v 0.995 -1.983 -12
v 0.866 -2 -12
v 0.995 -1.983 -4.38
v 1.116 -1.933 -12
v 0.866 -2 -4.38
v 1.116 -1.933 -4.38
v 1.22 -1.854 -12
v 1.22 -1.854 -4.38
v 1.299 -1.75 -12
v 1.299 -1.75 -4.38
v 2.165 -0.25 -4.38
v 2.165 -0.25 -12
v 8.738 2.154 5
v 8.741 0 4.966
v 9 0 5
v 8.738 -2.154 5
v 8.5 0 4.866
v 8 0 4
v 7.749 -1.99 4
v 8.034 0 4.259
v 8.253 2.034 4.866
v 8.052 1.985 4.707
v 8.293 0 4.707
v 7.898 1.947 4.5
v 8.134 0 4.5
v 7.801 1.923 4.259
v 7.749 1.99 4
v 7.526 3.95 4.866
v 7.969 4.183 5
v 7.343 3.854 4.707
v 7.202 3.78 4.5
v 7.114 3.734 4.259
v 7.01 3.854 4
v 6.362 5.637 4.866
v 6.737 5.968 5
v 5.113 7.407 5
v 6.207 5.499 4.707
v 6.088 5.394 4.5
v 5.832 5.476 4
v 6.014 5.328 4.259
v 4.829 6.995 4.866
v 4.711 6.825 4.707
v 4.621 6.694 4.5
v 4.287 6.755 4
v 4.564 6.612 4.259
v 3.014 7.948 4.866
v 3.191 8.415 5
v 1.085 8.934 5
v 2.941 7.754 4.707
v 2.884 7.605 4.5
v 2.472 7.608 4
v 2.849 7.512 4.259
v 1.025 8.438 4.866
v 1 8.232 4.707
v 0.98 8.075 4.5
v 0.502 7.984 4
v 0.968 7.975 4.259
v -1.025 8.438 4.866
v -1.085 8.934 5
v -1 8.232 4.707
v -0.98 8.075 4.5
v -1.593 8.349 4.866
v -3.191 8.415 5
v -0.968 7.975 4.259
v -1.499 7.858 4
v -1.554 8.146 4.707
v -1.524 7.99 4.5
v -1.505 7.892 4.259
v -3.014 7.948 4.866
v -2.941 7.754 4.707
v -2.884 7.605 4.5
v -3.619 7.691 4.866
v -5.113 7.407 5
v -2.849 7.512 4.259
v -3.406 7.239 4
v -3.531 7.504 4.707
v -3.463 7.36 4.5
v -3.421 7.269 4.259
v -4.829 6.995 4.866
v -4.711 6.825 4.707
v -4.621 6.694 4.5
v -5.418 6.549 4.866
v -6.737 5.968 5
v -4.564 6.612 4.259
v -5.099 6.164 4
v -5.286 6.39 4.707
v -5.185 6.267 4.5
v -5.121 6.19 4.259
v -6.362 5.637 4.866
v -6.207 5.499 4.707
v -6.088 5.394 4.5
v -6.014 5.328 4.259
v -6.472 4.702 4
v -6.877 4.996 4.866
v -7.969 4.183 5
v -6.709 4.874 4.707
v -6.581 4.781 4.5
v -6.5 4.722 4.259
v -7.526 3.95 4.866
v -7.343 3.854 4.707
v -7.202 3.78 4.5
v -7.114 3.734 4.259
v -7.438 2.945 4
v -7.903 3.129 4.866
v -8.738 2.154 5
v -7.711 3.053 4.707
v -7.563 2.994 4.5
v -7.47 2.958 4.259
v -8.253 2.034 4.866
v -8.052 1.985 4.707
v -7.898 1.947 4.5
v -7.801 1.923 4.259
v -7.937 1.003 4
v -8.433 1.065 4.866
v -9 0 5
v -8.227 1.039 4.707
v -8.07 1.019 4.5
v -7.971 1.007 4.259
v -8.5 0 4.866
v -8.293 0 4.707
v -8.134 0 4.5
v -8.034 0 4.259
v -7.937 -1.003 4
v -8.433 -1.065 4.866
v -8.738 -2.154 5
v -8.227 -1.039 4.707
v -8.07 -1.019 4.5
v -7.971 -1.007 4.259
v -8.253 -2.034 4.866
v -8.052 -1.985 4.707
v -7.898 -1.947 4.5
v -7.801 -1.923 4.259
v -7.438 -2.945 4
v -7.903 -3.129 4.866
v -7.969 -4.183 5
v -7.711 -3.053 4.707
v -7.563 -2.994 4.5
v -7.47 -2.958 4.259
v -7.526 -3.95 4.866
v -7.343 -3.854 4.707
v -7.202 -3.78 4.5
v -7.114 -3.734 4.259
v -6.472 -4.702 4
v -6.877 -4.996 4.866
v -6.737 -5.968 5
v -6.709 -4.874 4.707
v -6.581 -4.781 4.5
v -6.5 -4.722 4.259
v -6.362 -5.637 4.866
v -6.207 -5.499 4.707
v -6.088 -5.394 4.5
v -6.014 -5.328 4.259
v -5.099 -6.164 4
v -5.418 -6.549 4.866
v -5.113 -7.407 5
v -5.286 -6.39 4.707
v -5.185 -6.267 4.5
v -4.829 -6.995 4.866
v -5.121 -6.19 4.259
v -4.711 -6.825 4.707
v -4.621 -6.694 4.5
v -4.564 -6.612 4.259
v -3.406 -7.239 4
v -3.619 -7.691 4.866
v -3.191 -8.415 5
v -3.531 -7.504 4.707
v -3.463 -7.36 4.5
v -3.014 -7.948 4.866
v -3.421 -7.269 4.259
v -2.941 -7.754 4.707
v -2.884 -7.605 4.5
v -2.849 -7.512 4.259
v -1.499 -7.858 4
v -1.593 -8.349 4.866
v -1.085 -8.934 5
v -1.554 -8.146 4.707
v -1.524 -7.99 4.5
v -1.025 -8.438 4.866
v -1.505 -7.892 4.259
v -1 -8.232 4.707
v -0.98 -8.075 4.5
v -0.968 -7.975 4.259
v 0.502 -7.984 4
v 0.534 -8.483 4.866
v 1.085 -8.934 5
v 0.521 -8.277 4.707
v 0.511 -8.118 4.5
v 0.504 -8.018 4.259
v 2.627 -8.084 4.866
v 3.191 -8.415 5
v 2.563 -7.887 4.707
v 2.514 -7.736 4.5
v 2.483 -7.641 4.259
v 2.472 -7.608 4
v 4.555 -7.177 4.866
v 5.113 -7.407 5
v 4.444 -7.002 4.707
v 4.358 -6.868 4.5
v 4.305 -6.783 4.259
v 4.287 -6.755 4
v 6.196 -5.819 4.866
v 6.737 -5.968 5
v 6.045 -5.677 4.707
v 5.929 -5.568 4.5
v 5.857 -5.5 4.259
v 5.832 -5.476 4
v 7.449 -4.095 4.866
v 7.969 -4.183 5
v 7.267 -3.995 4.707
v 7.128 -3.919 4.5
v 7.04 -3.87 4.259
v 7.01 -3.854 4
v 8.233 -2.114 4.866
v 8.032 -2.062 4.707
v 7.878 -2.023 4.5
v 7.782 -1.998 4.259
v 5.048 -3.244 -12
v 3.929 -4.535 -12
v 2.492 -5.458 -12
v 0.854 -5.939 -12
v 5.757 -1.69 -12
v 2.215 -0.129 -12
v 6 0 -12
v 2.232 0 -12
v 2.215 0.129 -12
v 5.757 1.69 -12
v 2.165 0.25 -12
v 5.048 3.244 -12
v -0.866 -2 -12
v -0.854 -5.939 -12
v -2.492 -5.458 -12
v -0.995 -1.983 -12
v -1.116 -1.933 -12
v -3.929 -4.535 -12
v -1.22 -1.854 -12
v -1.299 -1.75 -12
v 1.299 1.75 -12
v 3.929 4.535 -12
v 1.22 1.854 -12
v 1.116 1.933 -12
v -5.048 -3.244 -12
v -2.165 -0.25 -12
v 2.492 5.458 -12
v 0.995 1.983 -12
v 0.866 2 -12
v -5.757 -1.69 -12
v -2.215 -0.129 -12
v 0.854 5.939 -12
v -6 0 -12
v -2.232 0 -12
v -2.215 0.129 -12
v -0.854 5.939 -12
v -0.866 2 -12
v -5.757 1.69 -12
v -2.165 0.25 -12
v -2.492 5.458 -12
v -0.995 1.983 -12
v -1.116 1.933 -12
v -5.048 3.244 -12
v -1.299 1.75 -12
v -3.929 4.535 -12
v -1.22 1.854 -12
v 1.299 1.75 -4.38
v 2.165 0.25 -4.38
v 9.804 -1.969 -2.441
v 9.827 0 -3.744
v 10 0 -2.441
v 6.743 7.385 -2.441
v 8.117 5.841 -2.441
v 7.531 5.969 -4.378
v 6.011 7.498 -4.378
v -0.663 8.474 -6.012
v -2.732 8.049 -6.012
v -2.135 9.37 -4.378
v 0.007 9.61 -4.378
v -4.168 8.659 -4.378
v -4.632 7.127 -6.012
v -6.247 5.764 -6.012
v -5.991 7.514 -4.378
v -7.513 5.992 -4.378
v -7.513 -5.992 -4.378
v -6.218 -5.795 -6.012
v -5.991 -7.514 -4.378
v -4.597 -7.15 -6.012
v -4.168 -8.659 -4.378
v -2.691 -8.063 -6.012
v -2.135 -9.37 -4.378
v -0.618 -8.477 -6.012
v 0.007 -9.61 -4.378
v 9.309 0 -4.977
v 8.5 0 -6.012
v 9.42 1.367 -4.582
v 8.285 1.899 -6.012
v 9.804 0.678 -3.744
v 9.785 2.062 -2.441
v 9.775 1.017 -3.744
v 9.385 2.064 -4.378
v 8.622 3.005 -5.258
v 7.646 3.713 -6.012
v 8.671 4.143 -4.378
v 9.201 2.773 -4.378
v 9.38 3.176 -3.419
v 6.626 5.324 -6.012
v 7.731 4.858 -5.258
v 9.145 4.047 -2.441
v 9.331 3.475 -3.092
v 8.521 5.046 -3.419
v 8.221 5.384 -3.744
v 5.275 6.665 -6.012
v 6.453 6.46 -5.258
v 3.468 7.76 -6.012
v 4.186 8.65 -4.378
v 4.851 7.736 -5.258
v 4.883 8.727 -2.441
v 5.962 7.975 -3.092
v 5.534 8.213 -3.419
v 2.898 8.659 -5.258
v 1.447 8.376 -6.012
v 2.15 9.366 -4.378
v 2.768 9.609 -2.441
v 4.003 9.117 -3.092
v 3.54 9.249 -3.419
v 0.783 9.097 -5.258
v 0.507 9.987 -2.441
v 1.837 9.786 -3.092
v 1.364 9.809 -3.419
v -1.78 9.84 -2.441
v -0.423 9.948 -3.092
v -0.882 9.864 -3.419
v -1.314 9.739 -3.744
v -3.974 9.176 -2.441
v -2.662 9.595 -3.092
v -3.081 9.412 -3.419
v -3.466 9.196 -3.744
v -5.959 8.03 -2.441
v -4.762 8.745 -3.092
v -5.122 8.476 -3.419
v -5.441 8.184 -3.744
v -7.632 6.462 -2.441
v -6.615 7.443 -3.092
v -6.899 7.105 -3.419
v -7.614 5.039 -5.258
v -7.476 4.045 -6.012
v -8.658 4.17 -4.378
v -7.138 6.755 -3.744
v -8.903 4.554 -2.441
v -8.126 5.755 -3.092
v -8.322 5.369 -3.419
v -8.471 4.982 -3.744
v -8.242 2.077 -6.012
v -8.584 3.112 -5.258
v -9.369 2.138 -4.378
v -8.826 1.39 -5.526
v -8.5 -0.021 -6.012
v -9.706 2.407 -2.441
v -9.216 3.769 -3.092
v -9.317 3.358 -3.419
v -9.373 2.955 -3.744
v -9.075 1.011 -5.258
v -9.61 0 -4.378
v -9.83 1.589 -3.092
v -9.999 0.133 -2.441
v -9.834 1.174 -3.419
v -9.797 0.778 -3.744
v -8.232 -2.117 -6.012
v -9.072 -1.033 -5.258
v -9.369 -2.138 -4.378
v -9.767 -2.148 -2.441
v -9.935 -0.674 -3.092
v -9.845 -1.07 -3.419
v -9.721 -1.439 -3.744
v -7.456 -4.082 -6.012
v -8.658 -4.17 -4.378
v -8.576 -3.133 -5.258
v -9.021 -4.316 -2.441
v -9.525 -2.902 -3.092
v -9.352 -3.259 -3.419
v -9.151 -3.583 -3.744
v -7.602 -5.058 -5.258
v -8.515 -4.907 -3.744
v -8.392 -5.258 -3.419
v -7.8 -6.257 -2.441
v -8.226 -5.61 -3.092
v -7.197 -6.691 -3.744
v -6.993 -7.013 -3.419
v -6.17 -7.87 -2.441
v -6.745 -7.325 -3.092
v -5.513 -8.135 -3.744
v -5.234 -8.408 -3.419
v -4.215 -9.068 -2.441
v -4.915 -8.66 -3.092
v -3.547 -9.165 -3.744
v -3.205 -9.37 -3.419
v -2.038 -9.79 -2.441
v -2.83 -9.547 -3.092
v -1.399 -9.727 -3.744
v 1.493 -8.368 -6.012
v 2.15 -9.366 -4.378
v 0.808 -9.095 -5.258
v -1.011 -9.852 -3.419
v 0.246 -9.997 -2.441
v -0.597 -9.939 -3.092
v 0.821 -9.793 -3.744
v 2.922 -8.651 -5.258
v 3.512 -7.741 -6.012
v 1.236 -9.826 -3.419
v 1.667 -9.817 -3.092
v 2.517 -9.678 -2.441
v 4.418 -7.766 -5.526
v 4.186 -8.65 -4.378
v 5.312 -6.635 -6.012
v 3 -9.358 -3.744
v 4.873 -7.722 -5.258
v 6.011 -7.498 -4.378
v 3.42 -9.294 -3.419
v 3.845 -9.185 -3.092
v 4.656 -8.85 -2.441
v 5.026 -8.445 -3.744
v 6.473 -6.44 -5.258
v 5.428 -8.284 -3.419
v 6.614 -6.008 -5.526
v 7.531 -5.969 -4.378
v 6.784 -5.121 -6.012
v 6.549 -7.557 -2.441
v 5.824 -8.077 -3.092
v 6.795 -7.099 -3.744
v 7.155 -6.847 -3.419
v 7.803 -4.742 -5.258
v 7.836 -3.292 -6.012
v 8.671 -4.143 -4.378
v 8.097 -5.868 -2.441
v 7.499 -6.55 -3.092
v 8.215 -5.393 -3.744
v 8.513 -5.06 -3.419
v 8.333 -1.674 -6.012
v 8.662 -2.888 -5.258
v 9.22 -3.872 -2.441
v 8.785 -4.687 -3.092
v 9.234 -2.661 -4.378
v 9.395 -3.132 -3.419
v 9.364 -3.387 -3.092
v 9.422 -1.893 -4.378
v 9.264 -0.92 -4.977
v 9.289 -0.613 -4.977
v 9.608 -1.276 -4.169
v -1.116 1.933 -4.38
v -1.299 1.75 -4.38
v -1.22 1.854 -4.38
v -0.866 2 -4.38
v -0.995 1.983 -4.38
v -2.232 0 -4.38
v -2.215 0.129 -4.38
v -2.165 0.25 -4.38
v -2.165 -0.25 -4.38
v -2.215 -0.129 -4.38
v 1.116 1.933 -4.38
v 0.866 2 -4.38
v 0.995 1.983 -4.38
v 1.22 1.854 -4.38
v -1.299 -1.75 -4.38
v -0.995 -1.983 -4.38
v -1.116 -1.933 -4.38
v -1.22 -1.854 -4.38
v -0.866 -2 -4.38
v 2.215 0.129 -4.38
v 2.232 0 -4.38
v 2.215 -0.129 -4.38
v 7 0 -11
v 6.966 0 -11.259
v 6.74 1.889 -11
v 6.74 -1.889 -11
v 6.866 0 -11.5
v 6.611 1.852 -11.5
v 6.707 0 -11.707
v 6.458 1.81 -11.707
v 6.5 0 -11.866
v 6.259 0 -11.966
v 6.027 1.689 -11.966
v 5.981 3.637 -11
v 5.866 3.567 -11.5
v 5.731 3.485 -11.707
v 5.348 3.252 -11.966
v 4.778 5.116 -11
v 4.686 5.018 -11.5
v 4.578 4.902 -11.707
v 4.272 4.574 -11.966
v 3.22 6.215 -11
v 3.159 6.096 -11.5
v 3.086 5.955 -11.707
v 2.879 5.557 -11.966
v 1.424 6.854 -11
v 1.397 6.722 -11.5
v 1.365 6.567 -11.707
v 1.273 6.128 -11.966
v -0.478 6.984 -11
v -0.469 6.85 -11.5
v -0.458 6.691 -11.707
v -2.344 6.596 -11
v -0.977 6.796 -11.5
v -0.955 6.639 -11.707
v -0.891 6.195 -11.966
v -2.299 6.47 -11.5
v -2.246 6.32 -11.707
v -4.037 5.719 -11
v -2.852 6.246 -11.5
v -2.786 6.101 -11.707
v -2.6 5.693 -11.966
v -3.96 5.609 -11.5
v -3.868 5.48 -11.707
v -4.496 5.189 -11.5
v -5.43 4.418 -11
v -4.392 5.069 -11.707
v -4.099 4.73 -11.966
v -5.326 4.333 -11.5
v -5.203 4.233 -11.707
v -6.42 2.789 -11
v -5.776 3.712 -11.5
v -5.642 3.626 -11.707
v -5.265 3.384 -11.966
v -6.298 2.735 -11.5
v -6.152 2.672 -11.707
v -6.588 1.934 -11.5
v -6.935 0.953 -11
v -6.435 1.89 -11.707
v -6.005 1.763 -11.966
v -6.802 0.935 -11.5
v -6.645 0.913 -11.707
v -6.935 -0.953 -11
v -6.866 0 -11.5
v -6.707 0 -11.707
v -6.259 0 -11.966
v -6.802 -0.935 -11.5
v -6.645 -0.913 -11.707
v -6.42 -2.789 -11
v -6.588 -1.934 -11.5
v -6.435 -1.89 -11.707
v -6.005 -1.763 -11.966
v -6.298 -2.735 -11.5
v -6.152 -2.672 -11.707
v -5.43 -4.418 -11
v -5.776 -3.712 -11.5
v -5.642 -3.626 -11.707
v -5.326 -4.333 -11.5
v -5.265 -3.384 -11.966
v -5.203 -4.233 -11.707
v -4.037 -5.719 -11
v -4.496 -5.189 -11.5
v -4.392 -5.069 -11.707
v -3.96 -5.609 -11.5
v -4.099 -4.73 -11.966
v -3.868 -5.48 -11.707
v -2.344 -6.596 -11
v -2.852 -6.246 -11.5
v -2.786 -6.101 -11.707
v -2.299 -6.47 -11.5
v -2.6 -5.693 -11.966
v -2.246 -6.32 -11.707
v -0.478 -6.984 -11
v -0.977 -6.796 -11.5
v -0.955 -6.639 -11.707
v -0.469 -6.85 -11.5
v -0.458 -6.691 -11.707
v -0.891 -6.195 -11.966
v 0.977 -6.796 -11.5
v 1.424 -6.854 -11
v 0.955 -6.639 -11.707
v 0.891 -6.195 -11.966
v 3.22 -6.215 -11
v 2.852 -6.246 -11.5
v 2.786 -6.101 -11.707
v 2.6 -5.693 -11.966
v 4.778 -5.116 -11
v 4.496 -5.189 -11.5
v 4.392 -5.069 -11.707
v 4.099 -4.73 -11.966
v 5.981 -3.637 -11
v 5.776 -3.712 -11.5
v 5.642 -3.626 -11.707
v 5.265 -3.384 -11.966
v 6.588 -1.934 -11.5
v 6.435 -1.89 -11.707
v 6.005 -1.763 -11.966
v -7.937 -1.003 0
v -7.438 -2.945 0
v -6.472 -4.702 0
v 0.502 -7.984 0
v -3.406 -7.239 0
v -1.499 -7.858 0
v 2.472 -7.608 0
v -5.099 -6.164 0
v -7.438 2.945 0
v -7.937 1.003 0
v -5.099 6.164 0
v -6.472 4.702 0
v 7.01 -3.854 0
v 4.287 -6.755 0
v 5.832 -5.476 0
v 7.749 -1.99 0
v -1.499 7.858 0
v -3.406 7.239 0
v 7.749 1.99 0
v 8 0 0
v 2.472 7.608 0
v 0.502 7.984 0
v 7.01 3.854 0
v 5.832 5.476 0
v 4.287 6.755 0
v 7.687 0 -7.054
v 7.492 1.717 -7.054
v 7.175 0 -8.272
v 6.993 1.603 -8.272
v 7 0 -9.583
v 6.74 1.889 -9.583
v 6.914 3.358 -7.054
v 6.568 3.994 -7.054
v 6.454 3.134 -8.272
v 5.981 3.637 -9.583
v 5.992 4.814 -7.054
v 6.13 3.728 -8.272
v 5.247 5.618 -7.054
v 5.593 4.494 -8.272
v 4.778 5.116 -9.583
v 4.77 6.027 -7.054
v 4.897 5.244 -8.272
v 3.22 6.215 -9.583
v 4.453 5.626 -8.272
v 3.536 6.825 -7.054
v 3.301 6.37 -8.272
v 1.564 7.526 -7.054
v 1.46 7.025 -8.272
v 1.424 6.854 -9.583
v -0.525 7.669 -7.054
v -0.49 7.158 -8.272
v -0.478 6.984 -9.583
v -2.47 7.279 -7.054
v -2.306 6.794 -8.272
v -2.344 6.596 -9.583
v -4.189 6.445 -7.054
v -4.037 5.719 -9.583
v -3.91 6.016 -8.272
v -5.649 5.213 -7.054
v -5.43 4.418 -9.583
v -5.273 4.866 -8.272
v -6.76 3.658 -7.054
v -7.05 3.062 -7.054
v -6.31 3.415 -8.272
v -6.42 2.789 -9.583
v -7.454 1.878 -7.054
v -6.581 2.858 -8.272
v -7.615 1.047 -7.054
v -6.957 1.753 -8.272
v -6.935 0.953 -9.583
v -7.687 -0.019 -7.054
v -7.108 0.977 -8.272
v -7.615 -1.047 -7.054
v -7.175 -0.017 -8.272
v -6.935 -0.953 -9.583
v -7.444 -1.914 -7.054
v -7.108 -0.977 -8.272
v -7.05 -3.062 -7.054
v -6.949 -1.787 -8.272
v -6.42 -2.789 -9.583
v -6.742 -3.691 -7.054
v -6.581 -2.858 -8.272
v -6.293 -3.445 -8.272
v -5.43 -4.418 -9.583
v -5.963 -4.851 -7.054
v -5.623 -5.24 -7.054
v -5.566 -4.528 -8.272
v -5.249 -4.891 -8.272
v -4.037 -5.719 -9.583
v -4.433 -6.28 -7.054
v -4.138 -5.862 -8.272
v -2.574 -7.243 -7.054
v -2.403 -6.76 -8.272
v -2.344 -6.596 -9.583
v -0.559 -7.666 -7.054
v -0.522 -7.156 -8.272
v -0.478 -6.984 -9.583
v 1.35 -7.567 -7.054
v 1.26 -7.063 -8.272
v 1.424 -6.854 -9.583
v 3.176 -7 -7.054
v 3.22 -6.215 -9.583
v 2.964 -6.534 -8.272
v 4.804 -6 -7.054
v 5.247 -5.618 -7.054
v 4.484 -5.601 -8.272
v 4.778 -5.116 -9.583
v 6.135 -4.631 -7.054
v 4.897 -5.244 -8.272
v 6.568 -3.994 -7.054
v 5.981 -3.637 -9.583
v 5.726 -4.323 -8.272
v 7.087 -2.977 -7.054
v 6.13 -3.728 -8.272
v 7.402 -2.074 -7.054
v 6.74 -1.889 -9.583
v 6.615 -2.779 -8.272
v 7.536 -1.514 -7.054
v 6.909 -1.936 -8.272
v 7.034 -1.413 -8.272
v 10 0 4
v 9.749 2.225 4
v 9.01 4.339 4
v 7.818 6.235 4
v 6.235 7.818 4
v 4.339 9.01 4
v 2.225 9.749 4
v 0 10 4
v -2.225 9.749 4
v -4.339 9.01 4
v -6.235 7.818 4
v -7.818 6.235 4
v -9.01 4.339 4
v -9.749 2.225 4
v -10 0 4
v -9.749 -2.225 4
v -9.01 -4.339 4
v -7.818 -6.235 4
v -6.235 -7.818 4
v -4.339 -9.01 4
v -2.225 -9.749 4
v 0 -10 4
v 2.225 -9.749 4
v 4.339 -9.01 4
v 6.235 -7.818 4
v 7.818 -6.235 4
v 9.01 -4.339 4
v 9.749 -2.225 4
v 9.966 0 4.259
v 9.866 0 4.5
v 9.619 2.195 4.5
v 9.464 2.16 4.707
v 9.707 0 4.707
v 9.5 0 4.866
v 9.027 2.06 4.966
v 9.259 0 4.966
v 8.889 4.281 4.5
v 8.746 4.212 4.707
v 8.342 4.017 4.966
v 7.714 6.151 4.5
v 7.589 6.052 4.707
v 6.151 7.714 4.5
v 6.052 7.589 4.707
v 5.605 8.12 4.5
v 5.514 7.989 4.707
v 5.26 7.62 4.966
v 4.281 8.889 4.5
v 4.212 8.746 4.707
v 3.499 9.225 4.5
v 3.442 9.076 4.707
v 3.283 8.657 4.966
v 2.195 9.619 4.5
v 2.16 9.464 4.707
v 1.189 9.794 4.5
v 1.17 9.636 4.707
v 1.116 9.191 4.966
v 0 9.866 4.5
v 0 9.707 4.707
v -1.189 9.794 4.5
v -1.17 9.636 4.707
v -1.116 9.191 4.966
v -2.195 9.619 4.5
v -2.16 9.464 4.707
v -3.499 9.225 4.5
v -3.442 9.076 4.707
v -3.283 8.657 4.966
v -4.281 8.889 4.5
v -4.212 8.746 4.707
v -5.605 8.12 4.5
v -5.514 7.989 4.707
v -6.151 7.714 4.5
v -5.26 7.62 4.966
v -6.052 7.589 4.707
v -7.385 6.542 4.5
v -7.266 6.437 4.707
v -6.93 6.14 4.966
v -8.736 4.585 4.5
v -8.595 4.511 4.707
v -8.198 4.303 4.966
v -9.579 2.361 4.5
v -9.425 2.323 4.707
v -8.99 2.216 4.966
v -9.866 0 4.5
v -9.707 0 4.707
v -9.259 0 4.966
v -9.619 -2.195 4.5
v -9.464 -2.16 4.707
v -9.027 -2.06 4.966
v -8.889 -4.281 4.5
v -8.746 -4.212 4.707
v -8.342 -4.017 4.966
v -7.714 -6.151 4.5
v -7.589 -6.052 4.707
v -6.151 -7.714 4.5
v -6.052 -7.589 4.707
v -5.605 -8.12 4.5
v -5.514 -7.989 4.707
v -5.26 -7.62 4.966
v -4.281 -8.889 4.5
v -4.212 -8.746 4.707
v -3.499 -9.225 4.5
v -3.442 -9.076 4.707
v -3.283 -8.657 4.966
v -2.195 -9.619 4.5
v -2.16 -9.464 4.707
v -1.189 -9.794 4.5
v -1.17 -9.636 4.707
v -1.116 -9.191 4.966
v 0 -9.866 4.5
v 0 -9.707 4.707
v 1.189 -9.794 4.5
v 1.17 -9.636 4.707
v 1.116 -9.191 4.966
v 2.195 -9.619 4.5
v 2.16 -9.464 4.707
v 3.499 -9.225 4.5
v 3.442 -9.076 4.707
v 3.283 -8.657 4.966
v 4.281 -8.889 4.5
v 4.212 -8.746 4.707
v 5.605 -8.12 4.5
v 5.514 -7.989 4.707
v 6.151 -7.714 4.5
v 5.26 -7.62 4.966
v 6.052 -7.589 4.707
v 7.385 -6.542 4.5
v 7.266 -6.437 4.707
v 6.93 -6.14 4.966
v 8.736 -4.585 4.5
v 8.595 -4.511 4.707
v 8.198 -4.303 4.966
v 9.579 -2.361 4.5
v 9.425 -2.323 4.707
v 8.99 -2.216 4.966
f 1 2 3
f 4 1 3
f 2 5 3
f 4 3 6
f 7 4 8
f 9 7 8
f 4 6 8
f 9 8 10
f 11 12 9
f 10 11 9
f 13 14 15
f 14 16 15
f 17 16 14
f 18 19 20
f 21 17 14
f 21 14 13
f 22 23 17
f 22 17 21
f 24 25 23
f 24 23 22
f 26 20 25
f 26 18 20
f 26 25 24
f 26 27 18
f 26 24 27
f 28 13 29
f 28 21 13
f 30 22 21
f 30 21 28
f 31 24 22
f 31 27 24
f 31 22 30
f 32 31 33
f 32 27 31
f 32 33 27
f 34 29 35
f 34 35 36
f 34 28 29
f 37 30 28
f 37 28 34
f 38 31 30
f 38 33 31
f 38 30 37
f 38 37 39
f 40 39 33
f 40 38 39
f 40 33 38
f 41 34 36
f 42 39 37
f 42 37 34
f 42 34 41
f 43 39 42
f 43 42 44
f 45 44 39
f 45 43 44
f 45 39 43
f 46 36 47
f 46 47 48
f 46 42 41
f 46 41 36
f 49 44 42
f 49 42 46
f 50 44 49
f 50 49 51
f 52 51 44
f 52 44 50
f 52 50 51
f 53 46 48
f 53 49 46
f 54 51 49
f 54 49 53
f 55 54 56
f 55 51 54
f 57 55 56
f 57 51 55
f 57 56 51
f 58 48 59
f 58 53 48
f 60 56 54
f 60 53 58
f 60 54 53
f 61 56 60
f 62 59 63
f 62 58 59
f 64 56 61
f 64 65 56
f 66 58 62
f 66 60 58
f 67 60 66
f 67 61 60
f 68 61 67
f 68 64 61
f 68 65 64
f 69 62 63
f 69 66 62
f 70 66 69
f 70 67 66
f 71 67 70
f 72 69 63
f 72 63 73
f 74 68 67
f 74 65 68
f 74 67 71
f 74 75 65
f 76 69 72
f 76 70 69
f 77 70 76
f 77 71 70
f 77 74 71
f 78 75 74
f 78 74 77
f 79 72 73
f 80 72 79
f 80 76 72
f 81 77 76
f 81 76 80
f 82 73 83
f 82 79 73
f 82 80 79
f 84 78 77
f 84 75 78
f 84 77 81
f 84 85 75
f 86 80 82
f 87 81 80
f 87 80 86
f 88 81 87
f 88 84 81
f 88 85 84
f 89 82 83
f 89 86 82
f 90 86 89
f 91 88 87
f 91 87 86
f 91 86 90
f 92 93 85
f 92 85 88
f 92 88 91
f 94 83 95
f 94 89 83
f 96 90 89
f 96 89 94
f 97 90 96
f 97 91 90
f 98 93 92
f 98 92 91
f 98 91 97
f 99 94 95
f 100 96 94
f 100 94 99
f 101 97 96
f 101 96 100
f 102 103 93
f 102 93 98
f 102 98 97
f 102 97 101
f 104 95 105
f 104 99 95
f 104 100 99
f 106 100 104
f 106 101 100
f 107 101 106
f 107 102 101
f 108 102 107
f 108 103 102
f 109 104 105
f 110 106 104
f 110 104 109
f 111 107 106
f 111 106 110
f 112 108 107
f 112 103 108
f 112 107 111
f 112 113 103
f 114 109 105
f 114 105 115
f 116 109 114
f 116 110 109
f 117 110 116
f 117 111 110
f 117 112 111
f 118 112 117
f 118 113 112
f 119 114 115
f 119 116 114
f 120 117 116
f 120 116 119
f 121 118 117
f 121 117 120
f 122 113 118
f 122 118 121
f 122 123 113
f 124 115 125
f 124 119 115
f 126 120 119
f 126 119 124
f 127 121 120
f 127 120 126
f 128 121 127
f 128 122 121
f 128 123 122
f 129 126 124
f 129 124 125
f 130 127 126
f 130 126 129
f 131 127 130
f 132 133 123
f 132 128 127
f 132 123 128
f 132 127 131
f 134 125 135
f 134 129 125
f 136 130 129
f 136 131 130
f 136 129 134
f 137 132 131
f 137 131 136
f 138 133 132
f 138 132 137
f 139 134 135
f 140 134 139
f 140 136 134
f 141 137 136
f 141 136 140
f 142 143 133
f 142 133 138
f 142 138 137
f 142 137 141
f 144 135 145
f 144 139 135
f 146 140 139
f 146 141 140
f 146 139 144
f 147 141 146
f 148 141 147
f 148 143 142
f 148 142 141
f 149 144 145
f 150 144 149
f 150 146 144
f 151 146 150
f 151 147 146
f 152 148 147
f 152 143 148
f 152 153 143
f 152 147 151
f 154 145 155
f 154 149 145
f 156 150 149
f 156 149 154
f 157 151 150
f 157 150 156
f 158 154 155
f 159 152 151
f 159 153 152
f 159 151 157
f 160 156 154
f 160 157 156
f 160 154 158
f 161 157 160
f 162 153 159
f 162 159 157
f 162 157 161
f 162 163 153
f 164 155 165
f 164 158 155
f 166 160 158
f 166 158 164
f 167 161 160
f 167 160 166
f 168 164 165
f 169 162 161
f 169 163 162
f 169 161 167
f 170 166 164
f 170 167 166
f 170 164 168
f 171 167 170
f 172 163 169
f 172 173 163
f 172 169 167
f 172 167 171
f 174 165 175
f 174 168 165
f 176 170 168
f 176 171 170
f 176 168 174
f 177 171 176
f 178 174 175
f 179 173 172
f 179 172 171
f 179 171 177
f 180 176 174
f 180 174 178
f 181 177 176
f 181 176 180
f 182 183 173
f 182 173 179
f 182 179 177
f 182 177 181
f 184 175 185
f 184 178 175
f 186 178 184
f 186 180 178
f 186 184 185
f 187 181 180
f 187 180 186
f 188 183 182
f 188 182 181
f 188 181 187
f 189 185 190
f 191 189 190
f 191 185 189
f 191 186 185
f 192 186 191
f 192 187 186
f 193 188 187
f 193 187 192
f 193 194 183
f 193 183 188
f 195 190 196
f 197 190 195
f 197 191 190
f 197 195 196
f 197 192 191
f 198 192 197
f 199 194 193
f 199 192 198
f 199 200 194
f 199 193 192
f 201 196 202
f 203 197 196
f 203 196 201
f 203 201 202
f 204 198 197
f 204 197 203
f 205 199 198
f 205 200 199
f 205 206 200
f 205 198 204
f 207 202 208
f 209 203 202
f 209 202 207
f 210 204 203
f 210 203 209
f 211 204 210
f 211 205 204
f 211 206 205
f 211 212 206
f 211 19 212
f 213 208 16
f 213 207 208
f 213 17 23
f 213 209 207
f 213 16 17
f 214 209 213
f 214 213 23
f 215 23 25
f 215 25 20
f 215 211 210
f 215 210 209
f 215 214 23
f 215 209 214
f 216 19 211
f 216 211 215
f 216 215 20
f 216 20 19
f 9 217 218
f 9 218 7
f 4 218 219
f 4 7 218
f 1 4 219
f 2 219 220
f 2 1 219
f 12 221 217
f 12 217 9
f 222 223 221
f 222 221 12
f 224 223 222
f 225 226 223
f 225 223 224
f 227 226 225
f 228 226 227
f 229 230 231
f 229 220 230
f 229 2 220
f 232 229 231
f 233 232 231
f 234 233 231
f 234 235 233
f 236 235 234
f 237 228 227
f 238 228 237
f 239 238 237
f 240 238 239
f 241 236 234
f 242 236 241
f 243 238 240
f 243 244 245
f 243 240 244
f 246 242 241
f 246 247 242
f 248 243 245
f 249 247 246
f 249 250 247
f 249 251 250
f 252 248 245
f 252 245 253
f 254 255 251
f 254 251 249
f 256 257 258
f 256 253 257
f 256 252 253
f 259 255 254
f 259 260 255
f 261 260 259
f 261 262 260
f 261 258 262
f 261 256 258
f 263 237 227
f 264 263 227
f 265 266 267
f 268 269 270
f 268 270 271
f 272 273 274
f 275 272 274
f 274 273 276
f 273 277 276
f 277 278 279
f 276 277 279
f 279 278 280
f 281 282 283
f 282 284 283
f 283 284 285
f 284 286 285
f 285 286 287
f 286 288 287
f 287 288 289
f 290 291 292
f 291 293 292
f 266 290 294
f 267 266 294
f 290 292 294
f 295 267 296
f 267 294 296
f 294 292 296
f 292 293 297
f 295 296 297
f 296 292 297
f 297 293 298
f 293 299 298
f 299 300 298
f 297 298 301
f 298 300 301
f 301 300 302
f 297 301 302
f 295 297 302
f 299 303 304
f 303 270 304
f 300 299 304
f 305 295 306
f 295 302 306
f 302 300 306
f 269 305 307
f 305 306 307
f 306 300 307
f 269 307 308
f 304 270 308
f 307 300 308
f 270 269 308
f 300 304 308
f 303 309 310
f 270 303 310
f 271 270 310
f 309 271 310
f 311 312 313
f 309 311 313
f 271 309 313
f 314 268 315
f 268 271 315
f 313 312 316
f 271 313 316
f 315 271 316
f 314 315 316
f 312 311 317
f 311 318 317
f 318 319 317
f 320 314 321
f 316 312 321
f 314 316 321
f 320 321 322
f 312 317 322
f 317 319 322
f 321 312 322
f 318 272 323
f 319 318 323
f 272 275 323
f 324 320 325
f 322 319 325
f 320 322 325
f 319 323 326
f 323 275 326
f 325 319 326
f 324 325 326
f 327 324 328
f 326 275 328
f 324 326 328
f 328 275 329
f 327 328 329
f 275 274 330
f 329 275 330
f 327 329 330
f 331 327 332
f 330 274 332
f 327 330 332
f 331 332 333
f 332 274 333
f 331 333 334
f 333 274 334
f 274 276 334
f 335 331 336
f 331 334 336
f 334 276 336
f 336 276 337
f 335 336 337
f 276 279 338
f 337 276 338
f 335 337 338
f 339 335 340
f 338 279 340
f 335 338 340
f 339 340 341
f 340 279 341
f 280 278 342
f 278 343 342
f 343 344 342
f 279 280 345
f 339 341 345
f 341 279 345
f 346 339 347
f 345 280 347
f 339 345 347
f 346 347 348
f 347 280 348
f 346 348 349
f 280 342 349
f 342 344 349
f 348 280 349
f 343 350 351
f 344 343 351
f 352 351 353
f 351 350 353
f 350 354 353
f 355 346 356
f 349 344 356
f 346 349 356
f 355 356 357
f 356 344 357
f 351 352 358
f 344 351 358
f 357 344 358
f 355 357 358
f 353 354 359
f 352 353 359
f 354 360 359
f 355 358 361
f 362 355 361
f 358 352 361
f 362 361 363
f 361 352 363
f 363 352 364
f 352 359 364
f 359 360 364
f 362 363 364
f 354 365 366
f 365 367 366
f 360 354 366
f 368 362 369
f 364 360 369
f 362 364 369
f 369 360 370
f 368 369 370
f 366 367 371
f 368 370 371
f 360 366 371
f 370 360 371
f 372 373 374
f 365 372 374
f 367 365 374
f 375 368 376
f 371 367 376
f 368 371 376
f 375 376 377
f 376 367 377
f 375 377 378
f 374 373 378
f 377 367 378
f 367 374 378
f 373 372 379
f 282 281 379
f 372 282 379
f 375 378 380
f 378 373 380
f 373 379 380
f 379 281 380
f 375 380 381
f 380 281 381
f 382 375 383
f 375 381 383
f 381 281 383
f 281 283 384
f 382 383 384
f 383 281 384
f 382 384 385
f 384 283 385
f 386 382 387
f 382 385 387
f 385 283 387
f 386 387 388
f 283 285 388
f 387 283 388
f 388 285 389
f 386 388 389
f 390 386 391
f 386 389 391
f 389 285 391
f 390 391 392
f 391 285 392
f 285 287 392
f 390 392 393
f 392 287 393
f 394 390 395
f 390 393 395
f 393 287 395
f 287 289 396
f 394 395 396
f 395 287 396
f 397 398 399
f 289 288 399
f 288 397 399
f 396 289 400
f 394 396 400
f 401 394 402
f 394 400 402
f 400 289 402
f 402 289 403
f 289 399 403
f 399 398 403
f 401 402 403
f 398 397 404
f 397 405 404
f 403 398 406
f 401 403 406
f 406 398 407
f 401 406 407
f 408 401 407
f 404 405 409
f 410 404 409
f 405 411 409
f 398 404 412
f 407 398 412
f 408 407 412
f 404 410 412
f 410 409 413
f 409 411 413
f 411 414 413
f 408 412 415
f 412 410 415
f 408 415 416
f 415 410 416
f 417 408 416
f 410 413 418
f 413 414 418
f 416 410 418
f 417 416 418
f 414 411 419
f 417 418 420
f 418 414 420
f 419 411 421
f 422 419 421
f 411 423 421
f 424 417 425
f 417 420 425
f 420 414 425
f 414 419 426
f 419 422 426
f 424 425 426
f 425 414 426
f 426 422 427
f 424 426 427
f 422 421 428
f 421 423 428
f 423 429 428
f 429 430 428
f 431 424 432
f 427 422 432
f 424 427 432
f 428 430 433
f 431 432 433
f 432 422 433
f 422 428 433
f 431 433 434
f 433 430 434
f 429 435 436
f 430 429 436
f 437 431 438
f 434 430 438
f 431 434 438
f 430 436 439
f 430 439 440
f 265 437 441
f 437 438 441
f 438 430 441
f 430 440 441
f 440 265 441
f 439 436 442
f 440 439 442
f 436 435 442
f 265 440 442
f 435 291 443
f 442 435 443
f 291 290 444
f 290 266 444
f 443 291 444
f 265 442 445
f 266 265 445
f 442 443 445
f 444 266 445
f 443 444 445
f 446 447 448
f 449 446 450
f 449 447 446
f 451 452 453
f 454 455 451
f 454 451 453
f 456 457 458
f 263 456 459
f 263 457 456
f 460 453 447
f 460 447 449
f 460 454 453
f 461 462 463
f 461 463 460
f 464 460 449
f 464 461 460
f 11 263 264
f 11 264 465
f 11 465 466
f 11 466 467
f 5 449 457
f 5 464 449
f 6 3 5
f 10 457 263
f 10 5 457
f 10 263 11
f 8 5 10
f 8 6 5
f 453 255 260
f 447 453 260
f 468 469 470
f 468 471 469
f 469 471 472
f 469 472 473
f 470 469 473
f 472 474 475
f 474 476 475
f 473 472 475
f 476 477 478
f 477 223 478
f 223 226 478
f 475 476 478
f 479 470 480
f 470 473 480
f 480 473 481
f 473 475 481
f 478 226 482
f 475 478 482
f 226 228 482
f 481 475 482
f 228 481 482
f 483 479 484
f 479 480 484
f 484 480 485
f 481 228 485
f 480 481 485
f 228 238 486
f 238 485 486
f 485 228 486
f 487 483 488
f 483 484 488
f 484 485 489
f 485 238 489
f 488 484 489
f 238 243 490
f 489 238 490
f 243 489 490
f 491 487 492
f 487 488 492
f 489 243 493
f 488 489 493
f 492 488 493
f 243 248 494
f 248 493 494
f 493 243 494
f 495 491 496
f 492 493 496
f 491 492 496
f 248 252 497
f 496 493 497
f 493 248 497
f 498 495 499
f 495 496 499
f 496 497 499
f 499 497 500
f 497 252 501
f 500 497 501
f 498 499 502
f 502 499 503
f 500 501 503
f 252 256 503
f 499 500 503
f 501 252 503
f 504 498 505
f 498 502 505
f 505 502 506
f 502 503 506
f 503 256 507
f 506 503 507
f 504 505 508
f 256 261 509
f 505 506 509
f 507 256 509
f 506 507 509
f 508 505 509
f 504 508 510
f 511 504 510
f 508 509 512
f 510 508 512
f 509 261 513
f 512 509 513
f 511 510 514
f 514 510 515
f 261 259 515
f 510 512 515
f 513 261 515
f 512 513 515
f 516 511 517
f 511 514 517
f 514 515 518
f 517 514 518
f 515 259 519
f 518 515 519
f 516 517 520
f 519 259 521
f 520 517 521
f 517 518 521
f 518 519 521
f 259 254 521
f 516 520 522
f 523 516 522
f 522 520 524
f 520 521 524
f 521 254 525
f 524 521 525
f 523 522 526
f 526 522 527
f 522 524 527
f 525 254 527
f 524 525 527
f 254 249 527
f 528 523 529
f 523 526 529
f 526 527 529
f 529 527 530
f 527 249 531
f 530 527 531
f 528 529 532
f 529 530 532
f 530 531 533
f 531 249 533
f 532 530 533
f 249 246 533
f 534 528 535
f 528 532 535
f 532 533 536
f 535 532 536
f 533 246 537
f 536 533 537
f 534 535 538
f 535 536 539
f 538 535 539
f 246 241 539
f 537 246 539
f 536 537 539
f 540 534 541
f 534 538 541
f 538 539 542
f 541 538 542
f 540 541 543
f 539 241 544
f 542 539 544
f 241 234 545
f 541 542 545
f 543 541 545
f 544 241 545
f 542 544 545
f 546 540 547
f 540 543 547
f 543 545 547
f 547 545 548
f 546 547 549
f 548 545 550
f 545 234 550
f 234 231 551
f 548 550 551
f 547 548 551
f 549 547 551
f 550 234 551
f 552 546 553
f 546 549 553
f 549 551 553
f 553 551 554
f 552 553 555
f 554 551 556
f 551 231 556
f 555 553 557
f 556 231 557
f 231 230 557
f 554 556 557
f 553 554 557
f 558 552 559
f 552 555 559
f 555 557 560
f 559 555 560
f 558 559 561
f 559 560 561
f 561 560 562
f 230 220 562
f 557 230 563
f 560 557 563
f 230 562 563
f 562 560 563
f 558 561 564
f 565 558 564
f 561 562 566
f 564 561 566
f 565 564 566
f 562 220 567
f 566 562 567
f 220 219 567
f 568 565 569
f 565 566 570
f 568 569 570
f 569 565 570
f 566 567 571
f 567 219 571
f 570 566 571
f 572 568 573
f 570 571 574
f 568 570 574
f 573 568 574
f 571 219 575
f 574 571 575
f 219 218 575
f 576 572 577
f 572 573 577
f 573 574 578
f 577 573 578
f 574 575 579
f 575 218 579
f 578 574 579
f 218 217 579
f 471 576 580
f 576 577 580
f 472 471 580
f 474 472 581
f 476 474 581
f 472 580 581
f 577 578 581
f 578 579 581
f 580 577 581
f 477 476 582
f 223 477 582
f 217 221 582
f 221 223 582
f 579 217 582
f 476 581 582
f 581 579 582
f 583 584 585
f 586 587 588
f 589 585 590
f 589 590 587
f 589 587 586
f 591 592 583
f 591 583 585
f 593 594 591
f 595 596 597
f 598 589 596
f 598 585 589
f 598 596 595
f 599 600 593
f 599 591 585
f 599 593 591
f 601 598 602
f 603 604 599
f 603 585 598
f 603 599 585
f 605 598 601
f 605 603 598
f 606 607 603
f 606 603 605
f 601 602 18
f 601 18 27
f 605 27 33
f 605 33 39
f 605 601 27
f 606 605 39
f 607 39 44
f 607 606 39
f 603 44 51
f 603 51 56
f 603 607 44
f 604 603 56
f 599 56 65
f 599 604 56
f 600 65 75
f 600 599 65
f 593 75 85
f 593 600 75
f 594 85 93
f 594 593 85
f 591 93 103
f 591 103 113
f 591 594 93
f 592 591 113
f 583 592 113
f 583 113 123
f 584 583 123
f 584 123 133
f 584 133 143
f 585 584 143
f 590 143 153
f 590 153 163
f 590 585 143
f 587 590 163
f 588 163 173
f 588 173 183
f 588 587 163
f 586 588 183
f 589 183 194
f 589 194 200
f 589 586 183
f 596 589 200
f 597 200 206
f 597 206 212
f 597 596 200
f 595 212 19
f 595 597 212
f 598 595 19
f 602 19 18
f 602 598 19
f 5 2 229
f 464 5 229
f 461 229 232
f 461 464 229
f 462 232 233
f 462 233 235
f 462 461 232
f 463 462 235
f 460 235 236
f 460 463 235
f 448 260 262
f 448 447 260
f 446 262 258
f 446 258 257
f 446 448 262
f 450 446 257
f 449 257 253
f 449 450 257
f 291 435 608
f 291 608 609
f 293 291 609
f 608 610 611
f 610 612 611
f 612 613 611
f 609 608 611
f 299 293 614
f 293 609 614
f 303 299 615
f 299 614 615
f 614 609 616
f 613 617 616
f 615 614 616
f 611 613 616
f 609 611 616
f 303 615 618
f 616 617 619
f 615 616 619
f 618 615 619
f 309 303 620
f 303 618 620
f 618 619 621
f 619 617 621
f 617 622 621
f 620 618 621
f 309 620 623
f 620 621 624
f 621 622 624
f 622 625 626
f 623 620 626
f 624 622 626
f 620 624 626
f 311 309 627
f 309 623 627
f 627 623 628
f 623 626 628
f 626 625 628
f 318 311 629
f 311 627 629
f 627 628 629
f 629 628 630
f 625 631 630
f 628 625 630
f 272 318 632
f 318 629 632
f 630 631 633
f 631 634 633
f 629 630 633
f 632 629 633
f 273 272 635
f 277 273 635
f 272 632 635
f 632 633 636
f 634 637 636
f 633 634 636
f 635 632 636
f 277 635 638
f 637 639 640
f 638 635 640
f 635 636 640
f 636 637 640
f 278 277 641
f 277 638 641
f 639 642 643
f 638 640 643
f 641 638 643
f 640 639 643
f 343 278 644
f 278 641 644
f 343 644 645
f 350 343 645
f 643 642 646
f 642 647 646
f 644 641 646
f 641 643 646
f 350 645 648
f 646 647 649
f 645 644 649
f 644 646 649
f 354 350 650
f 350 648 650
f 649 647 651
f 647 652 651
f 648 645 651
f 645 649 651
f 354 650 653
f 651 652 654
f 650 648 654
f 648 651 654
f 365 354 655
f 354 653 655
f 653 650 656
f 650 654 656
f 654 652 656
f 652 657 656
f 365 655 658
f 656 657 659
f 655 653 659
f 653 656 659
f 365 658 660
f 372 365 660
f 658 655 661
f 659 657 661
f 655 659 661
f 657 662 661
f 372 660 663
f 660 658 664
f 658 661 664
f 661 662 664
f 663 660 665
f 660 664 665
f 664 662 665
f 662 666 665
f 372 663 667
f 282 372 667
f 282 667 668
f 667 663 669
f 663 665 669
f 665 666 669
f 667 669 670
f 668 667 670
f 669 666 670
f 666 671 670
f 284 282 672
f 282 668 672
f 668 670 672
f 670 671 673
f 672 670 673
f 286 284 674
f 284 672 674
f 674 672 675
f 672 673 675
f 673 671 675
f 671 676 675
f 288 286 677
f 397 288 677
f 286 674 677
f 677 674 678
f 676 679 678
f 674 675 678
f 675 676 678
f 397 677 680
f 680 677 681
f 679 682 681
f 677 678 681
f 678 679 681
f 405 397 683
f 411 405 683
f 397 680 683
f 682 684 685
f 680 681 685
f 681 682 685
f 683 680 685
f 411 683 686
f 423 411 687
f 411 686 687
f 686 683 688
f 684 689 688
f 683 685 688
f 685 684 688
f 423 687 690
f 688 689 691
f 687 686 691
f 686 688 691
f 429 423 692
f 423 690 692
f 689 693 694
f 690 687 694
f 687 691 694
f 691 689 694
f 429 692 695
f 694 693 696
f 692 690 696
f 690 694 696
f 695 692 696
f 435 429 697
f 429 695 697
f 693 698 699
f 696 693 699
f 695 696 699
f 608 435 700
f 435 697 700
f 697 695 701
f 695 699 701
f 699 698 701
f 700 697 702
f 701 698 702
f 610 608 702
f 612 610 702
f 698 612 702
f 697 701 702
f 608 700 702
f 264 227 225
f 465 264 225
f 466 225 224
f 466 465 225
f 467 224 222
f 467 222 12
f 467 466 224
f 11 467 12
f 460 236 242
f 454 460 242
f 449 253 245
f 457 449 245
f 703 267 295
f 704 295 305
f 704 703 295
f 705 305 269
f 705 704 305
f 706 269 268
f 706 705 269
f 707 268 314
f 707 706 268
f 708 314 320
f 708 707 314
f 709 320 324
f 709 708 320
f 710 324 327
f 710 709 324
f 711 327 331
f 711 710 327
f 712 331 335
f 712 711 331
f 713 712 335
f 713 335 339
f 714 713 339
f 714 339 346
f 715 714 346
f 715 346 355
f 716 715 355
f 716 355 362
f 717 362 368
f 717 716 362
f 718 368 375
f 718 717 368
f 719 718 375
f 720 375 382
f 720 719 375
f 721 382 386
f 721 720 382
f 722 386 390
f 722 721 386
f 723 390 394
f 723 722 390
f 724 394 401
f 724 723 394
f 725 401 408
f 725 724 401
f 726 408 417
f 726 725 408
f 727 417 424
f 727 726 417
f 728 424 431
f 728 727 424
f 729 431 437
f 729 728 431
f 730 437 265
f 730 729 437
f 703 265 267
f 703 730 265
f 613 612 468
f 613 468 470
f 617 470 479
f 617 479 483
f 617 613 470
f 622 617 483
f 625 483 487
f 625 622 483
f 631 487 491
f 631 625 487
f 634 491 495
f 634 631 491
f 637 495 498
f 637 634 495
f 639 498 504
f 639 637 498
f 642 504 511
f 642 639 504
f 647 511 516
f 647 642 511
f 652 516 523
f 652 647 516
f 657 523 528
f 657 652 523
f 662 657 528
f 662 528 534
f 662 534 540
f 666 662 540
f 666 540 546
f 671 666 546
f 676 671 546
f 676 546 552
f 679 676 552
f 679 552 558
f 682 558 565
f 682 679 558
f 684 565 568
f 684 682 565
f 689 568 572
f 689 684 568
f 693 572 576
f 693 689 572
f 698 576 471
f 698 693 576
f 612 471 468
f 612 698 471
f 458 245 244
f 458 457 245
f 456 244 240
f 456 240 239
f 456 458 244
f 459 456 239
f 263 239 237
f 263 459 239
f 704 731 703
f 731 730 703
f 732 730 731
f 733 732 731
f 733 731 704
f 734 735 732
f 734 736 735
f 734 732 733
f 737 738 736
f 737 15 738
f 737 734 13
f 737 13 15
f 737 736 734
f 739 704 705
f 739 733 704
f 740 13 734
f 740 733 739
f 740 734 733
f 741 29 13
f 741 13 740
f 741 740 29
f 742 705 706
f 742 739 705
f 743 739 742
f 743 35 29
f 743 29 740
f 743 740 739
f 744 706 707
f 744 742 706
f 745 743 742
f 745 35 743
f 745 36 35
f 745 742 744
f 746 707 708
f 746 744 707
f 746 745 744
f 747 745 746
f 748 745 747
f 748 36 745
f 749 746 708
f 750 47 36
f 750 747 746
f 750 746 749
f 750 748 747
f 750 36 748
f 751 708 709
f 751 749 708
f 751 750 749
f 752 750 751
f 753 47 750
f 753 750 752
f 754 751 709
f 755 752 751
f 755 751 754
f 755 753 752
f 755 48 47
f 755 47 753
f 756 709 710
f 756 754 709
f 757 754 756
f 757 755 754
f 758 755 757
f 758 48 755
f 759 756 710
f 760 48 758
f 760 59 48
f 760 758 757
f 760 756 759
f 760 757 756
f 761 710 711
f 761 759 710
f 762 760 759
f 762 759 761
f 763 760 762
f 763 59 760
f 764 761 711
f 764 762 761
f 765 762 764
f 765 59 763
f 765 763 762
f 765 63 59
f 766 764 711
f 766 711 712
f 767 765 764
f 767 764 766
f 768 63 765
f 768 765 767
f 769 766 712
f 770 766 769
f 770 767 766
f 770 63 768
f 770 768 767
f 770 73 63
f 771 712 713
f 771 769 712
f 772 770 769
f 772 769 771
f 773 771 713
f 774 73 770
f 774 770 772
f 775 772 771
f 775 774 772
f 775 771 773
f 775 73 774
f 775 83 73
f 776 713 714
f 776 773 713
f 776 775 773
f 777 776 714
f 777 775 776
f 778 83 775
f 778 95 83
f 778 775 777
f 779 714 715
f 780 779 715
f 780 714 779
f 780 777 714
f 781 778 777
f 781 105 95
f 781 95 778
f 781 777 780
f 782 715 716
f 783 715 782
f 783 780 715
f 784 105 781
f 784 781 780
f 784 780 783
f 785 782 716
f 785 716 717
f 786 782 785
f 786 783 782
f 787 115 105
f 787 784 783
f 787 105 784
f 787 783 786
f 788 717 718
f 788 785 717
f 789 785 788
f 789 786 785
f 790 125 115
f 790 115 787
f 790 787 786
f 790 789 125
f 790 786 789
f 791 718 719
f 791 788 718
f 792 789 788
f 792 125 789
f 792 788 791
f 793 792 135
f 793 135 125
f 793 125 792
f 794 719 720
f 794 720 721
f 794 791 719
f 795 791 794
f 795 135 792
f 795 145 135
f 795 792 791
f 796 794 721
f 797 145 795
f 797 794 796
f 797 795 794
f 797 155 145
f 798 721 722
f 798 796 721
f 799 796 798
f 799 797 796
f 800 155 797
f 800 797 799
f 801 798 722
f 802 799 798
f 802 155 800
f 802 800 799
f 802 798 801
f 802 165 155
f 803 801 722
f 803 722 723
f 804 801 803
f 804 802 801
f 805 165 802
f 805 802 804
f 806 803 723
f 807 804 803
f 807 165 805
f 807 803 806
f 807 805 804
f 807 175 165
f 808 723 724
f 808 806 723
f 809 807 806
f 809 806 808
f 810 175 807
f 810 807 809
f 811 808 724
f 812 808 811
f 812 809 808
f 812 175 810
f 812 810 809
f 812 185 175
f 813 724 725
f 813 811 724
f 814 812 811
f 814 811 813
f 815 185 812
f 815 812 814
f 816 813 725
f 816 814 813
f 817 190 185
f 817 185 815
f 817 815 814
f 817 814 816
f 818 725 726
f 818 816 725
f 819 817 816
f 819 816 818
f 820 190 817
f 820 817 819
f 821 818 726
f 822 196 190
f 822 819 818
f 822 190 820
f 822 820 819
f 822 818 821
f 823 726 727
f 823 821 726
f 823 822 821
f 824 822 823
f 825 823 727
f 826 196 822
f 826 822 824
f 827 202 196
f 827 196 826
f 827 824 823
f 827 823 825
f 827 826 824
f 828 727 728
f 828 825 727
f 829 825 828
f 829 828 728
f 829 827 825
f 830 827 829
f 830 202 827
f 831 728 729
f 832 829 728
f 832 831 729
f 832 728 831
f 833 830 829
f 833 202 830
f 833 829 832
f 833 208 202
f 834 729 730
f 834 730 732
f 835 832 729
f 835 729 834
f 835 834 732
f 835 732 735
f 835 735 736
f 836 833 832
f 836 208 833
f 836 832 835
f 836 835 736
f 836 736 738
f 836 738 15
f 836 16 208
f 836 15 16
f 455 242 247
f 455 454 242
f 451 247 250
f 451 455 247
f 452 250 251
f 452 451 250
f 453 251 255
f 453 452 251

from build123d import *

# Parameters (mm, degrees)
F3_DEPTH = 7.62
F5_R     = 5
F6_R     = 0.99999
F7_R     = 0.5


# Not quite as in the source:
# - a fillet or chamfer that OpenCascade refuses, or shapes differently, is made with other operations: its cross-section is extruded or revolved along the edge and cut away or added
# - a fillet or chamfer is up to 0.001 mm smaller than in the source, because OpenCascade refuses the exact size


with BuildPart() as f1:
    # F0 (on Front) → F1 (revolve)
    with BuildSketch(Plane.XZ):
        Polygon((8, 5), (8, 0), (0, 0), (0, -12), (7, -12), (7, -5), (10, -5), (10, 5), align=None)
    revolve(axis=Axis((0, 0, -6), (0, 0, 1)))

    # F2 (on face) → F3 (cut)
    with BuildSketch(Plane(origin=(0, 0, -12), x_dir=(1, 0, 0), z_dir=(0, 0, -1))):
        Polygon((1.1547005384, 2), (-1.1547005384, 2), (-2.3094010768, 0), (-1.1547005384, -2), (1.1547005384, -2), (2.3094010768, 0), align=None)
    extrude(amount=-F3_DEPTH, mode=Mode.SUBTRACT)

    # F4: fillet of radius 5 on 1 edges, made by hand

    # F4_s1 → F4_t2 (revolve)
    with BuildSketch(Plane.XZ):
        with BuildLine():
            ThreePointArc((10, -5), (7.8166998673, -6.8439629074), (7, -9.582575695))
            Line((7, -9.582575695), (7, -5))
            Line((7, -5), (10, -5))
        make_face()
    revolve(axis=Axis((0, 0, -5), (0, 0, 1)))

    # F5
    f5_edges = [f1.edges().sort_by_distance(p)[0] for p in [
        (-10, 0, -5),
    ]]
    fillet(f5_edges, radius=F5_R)

    # F6 (radius 1 in the source; OpenCascade refuses exactly that, so slightly less here)
    f6_edges = [f1.edges().sort_by_distance(p)[0] for p in [
        (-10, 0, 5),
        (-8, 0, 5),
        (-7, 0, -12),
    ]]
    fillet(f6_edges, radius=F6_R)

    # F7
    f7_edges = [f1.edges().sort_by_distance(p)[0] for p in [
        (-2.309401, 0, -8.19),
        (-1.154701, -2, -8.19),
        (1.154701, -2, -8.19),
        (2.309401, 0, -8.19),
        (1.154701, 2, -8.19),
        (-1.154701, 2, -8.19),
    ]]
    fillet(f7_edges, radius=F7_R)


solid = f1.part
